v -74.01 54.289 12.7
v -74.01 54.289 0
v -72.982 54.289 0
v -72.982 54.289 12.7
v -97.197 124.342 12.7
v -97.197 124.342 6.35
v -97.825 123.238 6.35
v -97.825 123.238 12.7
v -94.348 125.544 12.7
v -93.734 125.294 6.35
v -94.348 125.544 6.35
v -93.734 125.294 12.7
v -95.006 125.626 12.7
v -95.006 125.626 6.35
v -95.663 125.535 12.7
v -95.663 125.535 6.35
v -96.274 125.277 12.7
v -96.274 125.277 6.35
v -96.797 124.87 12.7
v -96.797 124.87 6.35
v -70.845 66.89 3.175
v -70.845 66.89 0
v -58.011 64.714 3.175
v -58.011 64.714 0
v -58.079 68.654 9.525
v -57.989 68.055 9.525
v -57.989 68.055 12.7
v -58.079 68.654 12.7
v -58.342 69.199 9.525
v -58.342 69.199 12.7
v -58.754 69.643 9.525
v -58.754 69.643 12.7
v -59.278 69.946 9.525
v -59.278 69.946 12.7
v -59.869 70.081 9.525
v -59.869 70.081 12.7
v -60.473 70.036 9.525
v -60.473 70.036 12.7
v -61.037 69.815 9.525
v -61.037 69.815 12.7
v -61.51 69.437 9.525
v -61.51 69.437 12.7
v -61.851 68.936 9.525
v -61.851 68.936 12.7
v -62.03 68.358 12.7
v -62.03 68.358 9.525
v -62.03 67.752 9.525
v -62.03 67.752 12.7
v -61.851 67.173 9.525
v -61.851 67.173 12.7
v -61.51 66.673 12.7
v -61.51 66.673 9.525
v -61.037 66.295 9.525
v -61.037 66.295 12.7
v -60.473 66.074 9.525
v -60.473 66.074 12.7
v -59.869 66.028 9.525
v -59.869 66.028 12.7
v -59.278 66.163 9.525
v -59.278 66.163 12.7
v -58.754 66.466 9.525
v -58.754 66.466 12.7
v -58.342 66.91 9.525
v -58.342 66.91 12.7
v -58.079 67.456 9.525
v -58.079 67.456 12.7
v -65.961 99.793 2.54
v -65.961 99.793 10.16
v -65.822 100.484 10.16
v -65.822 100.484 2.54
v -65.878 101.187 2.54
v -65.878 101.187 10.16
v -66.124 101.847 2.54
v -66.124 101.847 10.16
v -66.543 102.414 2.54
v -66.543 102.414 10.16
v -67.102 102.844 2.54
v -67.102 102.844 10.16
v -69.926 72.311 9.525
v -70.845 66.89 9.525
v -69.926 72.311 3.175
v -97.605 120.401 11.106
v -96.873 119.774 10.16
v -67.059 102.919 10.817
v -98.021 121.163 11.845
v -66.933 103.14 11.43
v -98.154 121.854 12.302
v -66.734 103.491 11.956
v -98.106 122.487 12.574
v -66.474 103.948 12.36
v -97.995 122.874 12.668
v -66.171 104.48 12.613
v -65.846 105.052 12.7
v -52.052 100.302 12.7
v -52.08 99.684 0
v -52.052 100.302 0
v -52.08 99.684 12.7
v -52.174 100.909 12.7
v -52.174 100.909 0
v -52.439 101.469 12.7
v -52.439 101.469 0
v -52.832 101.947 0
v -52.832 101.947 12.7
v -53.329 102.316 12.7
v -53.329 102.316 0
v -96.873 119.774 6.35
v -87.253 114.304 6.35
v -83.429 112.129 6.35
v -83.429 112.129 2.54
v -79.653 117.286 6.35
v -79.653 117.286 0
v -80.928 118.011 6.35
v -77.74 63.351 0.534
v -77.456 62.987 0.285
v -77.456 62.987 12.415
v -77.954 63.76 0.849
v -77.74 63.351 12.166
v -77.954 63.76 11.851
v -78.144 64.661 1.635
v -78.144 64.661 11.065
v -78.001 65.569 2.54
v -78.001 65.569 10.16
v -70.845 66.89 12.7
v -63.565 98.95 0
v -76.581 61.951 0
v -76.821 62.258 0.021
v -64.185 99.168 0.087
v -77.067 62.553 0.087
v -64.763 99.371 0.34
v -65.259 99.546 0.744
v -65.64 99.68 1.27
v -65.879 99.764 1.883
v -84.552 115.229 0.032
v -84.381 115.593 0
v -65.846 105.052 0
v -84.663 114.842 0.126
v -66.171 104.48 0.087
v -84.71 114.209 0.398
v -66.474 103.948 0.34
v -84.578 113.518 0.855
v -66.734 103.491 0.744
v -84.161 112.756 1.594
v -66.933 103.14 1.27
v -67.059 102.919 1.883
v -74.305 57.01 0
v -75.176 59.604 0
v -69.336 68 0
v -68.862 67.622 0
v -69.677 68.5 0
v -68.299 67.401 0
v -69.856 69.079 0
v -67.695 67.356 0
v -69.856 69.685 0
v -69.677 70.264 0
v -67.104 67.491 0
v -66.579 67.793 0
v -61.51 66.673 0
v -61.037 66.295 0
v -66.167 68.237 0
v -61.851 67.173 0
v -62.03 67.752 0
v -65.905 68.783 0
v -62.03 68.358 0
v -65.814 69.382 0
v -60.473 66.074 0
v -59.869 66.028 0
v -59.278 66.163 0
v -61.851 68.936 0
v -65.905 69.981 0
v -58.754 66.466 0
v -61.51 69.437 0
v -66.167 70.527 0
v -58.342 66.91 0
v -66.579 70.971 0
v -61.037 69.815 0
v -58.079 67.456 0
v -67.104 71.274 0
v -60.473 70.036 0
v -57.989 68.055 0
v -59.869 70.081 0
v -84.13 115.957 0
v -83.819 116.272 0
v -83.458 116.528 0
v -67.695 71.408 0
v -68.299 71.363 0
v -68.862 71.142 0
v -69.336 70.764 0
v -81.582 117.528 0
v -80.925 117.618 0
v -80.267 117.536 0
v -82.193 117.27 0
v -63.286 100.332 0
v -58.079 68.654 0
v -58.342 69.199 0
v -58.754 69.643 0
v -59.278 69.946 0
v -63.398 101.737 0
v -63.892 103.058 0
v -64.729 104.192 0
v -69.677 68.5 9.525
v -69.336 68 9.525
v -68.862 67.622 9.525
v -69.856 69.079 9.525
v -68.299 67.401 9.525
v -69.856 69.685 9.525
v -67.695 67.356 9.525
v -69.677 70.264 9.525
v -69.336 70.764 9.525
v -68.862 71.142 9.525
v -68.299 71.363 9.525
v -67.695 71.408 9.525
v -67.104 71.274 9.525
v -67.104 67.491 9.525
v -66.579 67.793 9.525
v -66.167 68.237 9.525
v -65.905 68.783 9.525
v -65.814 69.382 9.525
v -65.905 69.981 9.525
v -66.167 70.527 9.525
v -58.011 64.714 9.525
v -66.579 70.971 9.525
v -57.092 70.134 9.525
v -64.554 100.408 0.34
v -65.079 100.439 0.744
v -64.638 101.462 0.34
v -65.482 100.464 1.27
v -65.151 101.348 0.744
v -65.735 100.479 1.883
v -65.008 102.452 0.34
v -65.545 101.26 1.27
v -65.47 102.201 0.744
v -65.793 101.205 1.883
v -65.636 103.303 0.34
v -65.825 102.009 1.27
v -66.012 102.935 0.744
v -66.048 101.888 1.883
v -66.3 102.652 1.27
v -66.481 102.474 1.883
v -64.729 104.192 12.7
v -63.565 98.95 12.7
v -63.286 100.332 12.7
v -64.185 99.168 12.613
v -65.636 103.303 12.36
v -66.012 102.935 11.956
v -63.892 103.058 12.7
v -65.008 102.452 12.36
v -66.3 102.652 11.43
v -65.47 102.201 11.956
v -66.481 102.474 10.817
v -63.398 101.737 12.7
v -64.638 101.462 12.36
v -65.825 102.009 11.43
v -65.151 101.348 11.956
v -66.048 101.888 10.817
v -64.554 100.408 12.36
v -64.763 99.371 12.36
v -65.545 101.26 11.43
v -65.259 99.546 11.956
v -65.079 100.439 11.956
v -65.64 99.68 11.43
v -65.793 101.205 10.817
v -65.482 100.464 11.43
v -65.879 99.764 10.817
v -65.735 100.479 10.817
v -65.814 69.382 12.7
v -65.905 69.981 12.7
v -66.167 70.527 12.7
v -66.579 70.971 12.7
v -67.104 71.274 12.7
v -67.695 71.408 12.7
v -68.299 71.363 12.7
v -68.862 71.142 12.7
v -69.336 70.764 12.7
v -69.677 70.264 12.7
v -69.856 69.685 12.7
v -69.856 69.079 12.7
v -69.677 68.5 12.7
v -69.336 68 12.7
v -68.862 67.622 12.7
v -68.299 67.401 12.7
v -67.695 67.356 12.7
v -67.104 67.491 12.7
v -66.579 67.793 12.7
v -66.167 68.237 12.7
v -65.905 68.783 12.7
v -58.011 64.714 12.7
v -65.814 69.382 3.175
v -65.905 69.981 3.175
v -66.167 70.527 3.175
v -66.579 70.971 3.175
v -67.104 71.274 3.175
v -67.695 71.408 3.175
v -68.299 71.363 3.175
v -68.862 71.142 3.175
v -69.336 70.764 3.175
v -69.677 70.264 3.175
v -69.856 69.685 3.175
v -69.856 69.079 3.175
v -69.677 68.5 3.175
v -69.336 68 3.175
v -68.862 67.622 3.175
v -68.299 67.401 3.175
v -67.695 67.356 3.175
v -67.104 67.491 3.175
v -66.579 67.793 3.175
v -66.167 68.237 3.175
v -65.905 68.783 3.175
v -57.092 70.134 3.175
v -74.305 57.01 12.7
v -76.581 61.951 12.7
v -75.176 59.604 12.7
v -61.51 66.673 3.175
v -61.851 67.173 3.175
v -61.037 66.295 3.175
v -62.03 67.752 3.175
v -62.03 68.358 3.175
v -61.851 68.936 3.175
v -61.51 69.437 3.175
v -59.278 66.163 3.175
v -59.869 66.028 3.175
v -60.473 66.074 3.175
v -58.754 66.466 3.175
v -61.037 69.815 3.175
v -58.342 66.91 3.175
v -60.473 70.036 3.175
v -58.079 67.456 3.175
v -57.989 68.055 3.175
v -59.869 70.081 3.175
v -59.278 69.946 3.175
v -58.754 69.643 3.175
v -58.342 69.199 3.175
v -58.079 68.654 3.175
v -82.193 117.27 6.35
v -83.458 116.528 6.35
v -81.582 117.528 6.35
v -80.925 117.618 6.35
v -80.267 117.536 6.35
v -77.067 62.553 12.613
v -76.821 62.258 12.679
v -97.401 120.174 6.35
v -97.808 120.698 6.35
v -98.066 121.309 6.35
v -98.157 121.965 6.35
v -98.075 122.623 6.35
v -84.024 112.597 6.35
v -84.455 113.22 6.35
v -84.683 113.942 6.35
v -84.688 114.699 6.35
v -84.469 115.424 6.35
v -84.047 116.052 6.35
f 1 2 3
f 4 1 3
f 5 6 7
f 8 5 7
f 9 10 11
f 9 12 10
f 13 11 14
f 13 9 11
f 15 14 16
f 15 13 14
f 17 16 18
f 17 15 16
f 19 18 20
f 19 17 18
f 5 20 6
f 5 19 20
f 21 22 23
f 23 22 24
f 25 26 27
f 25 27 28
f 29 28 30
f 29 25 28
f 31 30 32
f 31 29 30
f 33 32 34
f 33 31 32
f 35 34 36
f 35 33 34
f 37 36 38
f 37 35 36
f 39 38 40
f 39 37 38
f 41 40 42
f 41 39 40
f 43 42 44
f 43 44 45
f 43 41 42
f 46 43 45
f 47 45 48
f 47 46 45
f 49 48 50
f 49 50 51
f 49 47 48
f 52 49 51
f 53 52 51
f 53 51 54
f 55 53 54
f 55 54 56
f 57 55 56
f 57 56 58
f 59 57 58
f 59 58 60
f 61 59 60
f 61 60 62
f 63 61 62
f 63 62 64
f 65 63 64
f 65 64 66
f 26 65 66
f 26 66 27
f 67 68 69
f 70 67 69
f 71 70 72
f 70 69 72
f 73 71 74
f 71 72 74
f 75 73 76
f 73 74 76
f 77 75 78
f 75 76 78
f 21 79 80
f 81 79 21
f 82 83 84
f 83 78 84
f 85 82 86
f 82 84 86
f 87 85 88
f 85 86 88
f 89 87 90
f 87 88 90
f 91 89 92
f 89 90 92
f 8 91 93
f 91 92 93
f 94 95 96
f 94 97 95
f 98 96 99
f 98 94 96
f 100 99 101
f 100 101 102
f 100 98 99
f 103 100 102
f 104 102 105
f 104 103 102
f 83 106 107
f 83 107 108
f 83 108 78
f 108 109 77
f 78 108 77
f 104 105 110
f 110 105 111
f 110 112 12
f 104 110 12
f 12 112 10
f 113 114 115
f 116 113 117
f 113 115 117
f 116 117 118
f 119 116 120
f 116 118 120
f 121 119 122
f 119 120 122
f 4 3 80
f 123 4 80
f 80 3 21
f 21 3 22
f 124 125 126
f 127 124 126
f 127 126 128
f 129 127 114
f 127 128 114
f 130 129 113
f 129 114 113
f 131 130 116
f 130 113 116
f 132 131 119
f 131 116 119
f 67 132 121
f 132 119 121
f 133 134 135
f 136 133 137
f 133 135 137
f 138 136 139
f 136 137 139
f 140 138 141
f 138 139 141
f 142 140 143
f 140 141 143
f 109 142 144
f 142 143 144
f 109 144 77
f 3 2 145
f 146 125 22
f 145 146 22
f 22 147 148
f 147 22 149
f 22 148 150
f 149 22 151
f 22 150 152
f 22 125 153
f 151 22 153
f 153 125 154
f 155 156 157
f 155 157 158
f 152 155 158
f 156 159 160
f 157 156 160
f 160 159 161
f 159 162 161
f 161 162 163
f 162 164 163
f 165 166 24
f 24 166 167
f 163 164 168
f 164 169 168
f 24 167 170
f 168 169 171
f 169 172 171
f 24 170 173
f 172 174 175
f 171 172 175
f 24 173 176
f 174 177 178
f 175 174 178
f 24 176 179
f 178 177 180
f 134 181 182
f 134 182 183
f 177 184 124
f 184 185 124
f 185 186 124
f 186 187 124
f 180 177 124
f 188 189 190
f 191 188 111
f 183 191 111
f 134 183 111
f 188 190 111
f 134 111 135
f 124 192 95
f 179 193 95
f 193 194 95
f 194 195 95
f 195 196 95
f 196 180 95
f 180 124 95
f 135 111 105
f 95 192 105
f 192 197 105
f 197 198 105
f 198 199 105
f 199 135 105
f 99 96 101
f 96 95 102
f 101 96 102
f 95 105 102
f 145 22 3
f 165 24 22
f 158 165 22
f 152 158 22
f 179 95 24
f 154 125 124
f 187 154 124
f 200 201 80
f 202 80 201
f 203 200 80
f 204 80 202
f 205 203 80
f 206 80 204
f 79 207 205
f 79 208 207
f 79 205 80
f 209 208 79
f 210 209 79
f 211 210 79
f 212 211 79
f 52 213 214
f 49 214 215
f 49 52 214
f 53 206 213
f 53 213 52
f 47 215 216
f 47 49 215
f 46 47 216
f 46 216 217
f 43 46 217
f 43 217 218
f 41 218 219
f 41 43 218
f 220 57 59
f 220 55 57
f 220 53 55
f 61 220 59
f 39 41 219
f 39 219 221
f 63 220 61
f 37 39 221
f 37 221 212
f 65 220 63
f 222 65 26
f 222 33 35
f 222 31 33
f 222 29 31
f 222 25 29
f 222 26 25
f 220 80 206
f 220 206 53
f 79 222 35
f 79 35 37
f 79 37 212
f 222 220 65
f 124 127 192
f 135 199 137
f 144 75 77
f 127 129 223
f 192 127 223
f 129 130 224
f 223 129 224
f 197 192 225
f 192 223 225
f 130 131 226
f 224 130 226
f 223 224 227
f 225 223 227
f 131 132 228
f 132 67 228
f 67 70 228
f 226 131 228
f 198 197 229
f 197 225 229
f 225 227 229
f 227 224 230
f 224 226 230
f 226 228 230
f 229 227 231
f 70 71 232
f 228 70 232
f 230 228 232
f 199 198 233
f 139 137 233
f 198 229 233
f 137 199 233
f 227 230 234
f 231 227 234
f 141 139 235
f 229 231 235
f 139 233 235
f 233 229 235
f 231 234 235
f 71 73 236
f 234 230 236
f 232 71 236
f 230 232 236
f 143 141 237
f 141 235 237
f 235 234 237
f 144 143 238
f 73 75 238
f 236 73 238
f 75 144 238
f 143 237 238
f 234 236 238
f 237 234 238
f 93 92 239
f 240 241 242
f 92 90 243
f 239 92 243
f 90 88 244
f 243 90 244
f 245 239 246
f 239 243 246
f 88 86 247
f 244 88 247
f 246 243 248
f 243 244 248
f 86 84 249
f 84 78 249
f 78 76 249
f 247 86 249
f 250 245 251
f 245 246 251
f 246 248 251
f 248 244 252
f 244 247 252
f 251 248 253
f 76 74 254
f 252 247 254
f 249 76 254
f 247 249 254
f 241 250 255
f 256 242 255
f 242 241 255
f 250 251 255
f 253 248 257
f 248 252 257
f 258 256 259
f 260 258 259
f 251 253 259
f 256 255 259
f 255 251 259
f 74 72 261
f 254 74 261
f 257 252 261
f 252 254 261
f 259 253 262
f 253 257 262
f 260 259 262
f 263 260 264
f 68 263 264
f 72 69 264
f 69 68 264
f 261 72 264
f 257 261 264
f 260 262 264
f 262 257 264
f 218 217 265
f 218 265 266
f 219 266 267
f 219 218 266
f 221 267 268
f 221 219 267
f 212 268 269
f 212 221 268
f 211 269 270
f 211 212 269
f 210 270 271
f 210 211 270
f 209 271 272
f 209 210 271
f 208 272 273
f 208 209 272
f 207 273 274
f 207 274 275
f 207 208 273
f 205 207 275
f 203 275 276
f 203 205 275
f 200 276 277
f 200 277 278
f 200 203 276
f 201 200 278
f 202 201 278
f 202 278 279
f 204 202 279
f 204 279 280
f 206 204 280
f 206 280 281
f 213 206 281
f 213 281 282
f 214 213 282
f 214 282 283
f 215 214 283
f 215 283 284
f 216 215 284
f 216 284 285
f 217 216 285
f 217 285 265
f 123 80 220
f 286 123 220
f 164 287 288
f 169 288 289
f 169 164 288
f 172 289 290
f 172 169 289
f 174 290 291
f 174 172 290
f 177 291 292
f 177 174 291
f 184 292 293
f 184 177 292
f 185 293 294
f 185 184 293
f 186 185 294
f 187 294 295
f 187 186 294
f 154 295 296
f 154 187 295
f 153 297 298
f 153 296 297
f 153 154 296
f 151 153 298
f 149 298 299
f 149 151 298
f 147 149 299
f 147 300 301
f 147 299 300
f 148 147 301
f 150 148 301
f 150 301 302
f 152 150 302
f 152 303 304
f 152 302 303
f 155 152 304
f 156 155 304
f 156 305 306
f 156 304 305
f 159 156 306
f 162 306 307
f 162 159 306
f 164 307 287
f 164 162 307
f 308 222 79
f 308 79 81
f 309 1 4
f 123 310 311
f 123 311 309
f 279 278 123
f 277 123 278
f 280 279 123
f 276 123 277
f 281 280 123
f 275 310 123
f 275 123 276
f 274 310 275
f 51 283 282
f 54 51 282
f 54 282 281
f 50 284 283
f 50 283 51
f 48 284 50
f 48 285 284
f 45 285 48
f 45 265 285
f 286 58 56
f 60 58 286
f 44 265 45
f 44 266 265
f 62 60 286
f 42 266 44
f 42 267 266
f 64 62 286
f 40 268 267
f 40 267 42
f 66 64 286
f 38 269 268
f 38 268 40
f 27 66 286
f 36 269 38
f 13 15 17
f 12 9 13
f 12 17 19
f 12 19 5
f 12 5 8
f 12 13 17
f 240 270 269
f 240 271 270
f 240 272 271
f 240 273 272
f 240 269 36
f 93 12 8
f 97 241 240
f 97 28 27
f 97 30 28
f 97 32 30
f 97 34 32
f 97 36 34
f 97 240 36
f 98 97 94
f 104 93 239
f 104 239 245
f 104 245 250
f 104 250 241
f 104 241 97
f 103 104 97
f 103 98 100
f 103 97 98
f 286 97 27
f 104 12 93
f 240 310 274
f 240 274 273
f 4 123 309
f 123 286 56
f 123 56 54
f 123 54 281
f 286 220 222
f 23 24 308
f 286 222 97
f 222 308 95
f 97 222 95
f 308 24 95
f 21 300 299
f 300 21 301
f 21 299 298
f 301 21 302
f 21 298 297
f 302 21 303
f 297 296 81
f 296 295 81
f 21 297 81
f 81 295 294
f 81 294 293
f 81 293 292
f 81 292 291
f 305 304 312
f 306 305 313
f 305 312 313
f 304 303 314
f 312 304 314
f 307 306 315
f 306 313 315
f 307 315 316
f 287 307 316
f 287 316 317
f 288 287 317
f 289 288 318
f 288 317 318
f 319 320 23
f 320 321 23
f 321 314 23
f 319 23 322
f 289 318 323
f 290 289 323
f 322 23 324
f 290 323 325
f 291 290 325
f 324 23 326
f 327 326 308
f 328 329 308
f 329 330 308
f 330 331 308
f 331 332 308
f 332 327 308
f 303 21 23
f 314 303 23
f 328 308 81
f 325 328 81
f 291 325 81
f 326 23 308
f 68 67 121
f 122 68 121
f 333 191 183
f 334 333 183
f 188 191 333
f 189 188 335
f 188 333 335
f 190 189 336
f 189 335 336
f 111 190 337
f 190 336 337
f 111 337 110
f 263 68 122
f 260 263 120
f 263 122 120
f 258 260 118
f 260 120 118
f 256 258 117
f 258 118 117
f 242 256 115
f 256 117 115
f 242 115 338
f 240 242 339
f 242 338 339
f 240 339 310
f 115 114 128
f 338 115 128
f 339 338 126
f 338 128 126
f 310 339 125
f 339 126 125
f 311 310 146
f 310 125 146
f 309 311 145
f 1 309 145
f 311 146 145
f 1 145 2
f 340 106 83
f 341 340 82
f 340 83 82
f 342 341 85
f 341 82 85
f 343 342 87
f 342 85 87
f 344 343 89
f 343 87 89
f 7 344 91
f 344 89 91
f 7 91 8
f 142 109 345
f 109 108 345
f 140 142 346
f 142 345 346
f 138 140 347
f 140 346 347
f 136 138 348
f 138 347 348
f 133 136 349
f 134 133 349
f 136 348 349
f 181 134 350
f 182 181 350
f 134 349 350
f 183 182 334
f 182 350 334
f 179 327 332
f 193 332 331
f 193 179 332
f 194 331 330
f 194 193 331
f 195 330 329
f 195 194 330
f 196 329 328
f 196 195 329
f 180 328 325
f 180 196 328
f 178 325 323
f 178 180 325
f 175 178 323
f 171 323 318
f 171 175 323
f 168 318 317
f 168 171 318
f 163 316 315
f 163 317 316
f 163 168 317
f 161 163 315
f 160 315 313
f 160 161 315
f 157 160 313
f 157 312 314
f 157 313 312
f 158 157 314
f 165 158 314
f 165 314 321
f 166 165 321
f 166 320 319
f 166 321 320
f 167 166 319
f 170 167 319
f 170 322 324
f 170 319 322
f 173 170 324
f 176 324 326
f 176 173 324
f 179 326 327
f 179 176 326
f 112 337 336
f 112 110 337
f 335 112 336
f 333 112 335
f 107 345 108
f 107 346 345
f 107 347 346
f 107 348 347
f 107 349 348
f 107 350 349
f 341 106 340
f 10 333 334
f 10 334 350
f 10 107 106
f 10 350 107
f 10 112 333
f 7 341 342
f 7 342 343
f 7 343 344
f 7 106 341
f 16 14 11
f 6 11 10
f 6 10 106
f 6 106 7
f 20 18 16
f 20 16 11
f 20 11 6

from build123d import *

# Parameters (mm, degrees)
SKETCH3_R           = 2.032
BOSS_EXTRUDE1_DEPTH = 12.7
SKETCH4_W           = 6.35
SKETCH4_H           = 5.498034445
CUT_EXTRUDE1_DEPTH  = 13.0175
CUT_EXTRUDE2_DEPTH  = 6.35
FILLET1_R           = 2.54


with BuildPart() as part:
    # Sketch3 → Boss-Extrude1 (new body)
    with BuildSketch(Plane.XY):
        with BuildLine():
            Line((-70.84525545, 66.890422126), (-58.01103717, 64.713693529))
            Line((-58.01103717, 64.713693529), (-51.782586103, 101.43728904))
            Line((-51.782586103, 101.43728904), (-95.941552678, 126.549550409))
            Line((-95.941552678, 126.549550409), (-99.080585349, 121.029679588))
            Line((-99.080585349, 121.029679588), (-65.256808444, 101.794819897))
            Line((-65.256808444, 101.794819897), (-78.546820512, 64.018247195))
            ThreePointArc((-78.546820512, 64.018247195), (-75.200114259, 59.656734692), (-74.010223155, 54.289482767))
            Line((-74.010223155, 54.289482767), (-72.982419121, 54.289482767))
            Line((-72.982419121, 54.289482767), (-70.84525545, 66.890422126))
        make_face()
        with Locations((-67.846388341, 69.382080978)):
            Circle(SKETCH3_R, mode=Mode.SUBTRACT)
        with Locations((-60.020645487, 68.054807443)):
            Circle(SKETCH3_R, mode=Mode.SUBTRACT)
    extrude(amount=BOSS_EXTRUDE1_DEPTH)

    # Sketch4 → Cut-Extrude1 (cut)
    with BuildSketch(Plane(origin=(-67.057766981, 11.373233325, 0), x_dir=(0, 0, -1), z_dir=(0.98592036, -0.167215563, 0))):
        with Locations((-6.35, 56.851216947)):
            Rectangle(SKETCH4_W, SKETCH4_H)
    extrude(amount=-CUT_EXTRUDE1_DEPTH, mode=Mode.SUBTRACT)

    # Sketch5 → Cut-Extrude2 (cut)
    with BuildSketch(Plane(origin=(0, 0, 0), x_dir=(-1, 0, 0), z_dir=(0, 0, -1))):
        Polygon((99.080585349, 121.029679588), (95.941552678, 126.549550409), (80.927504042, 118.011381544), (87.253435619, 114.30383208), align=None)
    extrude(amount=-CUT_EXTRUDE2_DEPTH, mode=Mode.SUBTRACT)

    # Fillet1
    fillet1_edges = [part.edges().sort_by_distance(p)[0] for p in [
        (-71.901814478, 82.906533546, 0),
        (-76.255122031, 108.049325988, 0),
        (-78.546820512, 64.018247195, 6.35),
        (-65.256808444, 101.794819897, 6.35),
        (-99.080585349, 121.029679588, 9.525),
        (-95.941552678, 126.549550409, 9.525),
        (-51.782586103, 101.43728904, 6.35),
        (-82.168696896, 111.412249742, 12.7),
        (-71.901814478, 82.906533546, 12.7),
        (-87.253435619, 114.30383208, 3.175),
        (-80.927504042, 118.011381544, 3.175),
    ]]
    fillet(fillet1_edges, radius=FILLET1_R)


solid = part.part
